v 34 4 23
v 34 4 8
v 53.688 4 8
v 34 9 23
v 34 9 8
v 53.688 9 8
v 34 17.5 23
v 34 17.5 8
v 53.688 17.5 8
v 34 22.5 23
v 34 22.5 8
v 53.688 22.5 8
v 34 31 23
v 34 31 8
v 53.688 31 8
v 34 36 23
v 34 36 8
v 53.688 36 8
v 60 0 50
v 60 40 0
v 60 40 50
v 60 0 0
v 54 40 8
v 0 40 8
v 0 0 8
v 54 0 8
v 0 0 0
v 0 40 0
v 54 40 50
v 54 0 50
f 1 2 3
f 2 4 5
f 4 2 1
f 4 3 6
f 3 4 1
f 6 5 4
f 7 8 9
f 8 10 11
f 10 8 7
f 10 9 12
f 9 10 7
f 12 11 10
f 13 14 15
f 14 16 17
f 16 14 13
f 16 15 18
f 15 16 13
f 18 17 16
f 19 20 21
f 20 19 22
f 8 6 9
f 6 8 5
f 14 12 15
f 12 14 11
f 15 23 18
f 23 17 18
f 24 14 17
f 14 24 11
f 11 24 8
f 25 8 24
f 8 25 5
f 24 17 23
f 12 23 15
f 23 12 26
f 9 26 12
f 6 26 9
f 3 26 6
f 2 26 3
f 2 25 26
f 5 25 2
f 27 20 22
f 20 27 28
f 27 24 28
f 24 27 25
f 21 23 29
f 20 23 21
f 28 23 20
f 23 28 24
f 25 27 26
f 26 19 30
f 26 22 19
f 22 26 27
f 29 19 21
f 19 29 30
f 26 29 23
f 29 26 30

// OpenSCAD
$fn = 32;

// ----------------------------------------------------------------------
// Rib bracket: 3-gusset L bracket
// ----------------------------------------------------------------------

// --- parameters (mm) ---
base_l = 60;              // foot length, X
base_w = 40;              // foot width, Y
base_t = 8;               // foot thickness
plate_t = 6;              // upright plate thickness
plate_h = 50;             // overall height
gus_l = 20;               // gusset leg along the foot
gus_h = 16;               // gusset height
gus_t = 5;                // gusset thickness
gus_edge = 4;             // gusset margin from the foot edge
n_gus = 3;                // gusset count

gus_pitch = (base_w - 2 * gus_edge - gus_t) / (n_gus - 1);  // gusset pitch

union() {
  cube([base_l, base_w, base_t]);
  translate([base_l - plate_t, 0, base_t - 1])
    cube([plate_t, base_w, plate_h - base_t + 1]);
  for (i = [0 : n_gus - 1])
    translate([base_l - plate_t - gus_l, gus_edge + i * gus_pitch, base_t - 1])
      rotate([-90, 0, 0])
        linear_extrude(height = gus_t)
          polygon(points = [[0, 0], [gus_l + 1, 0], [0, -gus_h]]);
}
